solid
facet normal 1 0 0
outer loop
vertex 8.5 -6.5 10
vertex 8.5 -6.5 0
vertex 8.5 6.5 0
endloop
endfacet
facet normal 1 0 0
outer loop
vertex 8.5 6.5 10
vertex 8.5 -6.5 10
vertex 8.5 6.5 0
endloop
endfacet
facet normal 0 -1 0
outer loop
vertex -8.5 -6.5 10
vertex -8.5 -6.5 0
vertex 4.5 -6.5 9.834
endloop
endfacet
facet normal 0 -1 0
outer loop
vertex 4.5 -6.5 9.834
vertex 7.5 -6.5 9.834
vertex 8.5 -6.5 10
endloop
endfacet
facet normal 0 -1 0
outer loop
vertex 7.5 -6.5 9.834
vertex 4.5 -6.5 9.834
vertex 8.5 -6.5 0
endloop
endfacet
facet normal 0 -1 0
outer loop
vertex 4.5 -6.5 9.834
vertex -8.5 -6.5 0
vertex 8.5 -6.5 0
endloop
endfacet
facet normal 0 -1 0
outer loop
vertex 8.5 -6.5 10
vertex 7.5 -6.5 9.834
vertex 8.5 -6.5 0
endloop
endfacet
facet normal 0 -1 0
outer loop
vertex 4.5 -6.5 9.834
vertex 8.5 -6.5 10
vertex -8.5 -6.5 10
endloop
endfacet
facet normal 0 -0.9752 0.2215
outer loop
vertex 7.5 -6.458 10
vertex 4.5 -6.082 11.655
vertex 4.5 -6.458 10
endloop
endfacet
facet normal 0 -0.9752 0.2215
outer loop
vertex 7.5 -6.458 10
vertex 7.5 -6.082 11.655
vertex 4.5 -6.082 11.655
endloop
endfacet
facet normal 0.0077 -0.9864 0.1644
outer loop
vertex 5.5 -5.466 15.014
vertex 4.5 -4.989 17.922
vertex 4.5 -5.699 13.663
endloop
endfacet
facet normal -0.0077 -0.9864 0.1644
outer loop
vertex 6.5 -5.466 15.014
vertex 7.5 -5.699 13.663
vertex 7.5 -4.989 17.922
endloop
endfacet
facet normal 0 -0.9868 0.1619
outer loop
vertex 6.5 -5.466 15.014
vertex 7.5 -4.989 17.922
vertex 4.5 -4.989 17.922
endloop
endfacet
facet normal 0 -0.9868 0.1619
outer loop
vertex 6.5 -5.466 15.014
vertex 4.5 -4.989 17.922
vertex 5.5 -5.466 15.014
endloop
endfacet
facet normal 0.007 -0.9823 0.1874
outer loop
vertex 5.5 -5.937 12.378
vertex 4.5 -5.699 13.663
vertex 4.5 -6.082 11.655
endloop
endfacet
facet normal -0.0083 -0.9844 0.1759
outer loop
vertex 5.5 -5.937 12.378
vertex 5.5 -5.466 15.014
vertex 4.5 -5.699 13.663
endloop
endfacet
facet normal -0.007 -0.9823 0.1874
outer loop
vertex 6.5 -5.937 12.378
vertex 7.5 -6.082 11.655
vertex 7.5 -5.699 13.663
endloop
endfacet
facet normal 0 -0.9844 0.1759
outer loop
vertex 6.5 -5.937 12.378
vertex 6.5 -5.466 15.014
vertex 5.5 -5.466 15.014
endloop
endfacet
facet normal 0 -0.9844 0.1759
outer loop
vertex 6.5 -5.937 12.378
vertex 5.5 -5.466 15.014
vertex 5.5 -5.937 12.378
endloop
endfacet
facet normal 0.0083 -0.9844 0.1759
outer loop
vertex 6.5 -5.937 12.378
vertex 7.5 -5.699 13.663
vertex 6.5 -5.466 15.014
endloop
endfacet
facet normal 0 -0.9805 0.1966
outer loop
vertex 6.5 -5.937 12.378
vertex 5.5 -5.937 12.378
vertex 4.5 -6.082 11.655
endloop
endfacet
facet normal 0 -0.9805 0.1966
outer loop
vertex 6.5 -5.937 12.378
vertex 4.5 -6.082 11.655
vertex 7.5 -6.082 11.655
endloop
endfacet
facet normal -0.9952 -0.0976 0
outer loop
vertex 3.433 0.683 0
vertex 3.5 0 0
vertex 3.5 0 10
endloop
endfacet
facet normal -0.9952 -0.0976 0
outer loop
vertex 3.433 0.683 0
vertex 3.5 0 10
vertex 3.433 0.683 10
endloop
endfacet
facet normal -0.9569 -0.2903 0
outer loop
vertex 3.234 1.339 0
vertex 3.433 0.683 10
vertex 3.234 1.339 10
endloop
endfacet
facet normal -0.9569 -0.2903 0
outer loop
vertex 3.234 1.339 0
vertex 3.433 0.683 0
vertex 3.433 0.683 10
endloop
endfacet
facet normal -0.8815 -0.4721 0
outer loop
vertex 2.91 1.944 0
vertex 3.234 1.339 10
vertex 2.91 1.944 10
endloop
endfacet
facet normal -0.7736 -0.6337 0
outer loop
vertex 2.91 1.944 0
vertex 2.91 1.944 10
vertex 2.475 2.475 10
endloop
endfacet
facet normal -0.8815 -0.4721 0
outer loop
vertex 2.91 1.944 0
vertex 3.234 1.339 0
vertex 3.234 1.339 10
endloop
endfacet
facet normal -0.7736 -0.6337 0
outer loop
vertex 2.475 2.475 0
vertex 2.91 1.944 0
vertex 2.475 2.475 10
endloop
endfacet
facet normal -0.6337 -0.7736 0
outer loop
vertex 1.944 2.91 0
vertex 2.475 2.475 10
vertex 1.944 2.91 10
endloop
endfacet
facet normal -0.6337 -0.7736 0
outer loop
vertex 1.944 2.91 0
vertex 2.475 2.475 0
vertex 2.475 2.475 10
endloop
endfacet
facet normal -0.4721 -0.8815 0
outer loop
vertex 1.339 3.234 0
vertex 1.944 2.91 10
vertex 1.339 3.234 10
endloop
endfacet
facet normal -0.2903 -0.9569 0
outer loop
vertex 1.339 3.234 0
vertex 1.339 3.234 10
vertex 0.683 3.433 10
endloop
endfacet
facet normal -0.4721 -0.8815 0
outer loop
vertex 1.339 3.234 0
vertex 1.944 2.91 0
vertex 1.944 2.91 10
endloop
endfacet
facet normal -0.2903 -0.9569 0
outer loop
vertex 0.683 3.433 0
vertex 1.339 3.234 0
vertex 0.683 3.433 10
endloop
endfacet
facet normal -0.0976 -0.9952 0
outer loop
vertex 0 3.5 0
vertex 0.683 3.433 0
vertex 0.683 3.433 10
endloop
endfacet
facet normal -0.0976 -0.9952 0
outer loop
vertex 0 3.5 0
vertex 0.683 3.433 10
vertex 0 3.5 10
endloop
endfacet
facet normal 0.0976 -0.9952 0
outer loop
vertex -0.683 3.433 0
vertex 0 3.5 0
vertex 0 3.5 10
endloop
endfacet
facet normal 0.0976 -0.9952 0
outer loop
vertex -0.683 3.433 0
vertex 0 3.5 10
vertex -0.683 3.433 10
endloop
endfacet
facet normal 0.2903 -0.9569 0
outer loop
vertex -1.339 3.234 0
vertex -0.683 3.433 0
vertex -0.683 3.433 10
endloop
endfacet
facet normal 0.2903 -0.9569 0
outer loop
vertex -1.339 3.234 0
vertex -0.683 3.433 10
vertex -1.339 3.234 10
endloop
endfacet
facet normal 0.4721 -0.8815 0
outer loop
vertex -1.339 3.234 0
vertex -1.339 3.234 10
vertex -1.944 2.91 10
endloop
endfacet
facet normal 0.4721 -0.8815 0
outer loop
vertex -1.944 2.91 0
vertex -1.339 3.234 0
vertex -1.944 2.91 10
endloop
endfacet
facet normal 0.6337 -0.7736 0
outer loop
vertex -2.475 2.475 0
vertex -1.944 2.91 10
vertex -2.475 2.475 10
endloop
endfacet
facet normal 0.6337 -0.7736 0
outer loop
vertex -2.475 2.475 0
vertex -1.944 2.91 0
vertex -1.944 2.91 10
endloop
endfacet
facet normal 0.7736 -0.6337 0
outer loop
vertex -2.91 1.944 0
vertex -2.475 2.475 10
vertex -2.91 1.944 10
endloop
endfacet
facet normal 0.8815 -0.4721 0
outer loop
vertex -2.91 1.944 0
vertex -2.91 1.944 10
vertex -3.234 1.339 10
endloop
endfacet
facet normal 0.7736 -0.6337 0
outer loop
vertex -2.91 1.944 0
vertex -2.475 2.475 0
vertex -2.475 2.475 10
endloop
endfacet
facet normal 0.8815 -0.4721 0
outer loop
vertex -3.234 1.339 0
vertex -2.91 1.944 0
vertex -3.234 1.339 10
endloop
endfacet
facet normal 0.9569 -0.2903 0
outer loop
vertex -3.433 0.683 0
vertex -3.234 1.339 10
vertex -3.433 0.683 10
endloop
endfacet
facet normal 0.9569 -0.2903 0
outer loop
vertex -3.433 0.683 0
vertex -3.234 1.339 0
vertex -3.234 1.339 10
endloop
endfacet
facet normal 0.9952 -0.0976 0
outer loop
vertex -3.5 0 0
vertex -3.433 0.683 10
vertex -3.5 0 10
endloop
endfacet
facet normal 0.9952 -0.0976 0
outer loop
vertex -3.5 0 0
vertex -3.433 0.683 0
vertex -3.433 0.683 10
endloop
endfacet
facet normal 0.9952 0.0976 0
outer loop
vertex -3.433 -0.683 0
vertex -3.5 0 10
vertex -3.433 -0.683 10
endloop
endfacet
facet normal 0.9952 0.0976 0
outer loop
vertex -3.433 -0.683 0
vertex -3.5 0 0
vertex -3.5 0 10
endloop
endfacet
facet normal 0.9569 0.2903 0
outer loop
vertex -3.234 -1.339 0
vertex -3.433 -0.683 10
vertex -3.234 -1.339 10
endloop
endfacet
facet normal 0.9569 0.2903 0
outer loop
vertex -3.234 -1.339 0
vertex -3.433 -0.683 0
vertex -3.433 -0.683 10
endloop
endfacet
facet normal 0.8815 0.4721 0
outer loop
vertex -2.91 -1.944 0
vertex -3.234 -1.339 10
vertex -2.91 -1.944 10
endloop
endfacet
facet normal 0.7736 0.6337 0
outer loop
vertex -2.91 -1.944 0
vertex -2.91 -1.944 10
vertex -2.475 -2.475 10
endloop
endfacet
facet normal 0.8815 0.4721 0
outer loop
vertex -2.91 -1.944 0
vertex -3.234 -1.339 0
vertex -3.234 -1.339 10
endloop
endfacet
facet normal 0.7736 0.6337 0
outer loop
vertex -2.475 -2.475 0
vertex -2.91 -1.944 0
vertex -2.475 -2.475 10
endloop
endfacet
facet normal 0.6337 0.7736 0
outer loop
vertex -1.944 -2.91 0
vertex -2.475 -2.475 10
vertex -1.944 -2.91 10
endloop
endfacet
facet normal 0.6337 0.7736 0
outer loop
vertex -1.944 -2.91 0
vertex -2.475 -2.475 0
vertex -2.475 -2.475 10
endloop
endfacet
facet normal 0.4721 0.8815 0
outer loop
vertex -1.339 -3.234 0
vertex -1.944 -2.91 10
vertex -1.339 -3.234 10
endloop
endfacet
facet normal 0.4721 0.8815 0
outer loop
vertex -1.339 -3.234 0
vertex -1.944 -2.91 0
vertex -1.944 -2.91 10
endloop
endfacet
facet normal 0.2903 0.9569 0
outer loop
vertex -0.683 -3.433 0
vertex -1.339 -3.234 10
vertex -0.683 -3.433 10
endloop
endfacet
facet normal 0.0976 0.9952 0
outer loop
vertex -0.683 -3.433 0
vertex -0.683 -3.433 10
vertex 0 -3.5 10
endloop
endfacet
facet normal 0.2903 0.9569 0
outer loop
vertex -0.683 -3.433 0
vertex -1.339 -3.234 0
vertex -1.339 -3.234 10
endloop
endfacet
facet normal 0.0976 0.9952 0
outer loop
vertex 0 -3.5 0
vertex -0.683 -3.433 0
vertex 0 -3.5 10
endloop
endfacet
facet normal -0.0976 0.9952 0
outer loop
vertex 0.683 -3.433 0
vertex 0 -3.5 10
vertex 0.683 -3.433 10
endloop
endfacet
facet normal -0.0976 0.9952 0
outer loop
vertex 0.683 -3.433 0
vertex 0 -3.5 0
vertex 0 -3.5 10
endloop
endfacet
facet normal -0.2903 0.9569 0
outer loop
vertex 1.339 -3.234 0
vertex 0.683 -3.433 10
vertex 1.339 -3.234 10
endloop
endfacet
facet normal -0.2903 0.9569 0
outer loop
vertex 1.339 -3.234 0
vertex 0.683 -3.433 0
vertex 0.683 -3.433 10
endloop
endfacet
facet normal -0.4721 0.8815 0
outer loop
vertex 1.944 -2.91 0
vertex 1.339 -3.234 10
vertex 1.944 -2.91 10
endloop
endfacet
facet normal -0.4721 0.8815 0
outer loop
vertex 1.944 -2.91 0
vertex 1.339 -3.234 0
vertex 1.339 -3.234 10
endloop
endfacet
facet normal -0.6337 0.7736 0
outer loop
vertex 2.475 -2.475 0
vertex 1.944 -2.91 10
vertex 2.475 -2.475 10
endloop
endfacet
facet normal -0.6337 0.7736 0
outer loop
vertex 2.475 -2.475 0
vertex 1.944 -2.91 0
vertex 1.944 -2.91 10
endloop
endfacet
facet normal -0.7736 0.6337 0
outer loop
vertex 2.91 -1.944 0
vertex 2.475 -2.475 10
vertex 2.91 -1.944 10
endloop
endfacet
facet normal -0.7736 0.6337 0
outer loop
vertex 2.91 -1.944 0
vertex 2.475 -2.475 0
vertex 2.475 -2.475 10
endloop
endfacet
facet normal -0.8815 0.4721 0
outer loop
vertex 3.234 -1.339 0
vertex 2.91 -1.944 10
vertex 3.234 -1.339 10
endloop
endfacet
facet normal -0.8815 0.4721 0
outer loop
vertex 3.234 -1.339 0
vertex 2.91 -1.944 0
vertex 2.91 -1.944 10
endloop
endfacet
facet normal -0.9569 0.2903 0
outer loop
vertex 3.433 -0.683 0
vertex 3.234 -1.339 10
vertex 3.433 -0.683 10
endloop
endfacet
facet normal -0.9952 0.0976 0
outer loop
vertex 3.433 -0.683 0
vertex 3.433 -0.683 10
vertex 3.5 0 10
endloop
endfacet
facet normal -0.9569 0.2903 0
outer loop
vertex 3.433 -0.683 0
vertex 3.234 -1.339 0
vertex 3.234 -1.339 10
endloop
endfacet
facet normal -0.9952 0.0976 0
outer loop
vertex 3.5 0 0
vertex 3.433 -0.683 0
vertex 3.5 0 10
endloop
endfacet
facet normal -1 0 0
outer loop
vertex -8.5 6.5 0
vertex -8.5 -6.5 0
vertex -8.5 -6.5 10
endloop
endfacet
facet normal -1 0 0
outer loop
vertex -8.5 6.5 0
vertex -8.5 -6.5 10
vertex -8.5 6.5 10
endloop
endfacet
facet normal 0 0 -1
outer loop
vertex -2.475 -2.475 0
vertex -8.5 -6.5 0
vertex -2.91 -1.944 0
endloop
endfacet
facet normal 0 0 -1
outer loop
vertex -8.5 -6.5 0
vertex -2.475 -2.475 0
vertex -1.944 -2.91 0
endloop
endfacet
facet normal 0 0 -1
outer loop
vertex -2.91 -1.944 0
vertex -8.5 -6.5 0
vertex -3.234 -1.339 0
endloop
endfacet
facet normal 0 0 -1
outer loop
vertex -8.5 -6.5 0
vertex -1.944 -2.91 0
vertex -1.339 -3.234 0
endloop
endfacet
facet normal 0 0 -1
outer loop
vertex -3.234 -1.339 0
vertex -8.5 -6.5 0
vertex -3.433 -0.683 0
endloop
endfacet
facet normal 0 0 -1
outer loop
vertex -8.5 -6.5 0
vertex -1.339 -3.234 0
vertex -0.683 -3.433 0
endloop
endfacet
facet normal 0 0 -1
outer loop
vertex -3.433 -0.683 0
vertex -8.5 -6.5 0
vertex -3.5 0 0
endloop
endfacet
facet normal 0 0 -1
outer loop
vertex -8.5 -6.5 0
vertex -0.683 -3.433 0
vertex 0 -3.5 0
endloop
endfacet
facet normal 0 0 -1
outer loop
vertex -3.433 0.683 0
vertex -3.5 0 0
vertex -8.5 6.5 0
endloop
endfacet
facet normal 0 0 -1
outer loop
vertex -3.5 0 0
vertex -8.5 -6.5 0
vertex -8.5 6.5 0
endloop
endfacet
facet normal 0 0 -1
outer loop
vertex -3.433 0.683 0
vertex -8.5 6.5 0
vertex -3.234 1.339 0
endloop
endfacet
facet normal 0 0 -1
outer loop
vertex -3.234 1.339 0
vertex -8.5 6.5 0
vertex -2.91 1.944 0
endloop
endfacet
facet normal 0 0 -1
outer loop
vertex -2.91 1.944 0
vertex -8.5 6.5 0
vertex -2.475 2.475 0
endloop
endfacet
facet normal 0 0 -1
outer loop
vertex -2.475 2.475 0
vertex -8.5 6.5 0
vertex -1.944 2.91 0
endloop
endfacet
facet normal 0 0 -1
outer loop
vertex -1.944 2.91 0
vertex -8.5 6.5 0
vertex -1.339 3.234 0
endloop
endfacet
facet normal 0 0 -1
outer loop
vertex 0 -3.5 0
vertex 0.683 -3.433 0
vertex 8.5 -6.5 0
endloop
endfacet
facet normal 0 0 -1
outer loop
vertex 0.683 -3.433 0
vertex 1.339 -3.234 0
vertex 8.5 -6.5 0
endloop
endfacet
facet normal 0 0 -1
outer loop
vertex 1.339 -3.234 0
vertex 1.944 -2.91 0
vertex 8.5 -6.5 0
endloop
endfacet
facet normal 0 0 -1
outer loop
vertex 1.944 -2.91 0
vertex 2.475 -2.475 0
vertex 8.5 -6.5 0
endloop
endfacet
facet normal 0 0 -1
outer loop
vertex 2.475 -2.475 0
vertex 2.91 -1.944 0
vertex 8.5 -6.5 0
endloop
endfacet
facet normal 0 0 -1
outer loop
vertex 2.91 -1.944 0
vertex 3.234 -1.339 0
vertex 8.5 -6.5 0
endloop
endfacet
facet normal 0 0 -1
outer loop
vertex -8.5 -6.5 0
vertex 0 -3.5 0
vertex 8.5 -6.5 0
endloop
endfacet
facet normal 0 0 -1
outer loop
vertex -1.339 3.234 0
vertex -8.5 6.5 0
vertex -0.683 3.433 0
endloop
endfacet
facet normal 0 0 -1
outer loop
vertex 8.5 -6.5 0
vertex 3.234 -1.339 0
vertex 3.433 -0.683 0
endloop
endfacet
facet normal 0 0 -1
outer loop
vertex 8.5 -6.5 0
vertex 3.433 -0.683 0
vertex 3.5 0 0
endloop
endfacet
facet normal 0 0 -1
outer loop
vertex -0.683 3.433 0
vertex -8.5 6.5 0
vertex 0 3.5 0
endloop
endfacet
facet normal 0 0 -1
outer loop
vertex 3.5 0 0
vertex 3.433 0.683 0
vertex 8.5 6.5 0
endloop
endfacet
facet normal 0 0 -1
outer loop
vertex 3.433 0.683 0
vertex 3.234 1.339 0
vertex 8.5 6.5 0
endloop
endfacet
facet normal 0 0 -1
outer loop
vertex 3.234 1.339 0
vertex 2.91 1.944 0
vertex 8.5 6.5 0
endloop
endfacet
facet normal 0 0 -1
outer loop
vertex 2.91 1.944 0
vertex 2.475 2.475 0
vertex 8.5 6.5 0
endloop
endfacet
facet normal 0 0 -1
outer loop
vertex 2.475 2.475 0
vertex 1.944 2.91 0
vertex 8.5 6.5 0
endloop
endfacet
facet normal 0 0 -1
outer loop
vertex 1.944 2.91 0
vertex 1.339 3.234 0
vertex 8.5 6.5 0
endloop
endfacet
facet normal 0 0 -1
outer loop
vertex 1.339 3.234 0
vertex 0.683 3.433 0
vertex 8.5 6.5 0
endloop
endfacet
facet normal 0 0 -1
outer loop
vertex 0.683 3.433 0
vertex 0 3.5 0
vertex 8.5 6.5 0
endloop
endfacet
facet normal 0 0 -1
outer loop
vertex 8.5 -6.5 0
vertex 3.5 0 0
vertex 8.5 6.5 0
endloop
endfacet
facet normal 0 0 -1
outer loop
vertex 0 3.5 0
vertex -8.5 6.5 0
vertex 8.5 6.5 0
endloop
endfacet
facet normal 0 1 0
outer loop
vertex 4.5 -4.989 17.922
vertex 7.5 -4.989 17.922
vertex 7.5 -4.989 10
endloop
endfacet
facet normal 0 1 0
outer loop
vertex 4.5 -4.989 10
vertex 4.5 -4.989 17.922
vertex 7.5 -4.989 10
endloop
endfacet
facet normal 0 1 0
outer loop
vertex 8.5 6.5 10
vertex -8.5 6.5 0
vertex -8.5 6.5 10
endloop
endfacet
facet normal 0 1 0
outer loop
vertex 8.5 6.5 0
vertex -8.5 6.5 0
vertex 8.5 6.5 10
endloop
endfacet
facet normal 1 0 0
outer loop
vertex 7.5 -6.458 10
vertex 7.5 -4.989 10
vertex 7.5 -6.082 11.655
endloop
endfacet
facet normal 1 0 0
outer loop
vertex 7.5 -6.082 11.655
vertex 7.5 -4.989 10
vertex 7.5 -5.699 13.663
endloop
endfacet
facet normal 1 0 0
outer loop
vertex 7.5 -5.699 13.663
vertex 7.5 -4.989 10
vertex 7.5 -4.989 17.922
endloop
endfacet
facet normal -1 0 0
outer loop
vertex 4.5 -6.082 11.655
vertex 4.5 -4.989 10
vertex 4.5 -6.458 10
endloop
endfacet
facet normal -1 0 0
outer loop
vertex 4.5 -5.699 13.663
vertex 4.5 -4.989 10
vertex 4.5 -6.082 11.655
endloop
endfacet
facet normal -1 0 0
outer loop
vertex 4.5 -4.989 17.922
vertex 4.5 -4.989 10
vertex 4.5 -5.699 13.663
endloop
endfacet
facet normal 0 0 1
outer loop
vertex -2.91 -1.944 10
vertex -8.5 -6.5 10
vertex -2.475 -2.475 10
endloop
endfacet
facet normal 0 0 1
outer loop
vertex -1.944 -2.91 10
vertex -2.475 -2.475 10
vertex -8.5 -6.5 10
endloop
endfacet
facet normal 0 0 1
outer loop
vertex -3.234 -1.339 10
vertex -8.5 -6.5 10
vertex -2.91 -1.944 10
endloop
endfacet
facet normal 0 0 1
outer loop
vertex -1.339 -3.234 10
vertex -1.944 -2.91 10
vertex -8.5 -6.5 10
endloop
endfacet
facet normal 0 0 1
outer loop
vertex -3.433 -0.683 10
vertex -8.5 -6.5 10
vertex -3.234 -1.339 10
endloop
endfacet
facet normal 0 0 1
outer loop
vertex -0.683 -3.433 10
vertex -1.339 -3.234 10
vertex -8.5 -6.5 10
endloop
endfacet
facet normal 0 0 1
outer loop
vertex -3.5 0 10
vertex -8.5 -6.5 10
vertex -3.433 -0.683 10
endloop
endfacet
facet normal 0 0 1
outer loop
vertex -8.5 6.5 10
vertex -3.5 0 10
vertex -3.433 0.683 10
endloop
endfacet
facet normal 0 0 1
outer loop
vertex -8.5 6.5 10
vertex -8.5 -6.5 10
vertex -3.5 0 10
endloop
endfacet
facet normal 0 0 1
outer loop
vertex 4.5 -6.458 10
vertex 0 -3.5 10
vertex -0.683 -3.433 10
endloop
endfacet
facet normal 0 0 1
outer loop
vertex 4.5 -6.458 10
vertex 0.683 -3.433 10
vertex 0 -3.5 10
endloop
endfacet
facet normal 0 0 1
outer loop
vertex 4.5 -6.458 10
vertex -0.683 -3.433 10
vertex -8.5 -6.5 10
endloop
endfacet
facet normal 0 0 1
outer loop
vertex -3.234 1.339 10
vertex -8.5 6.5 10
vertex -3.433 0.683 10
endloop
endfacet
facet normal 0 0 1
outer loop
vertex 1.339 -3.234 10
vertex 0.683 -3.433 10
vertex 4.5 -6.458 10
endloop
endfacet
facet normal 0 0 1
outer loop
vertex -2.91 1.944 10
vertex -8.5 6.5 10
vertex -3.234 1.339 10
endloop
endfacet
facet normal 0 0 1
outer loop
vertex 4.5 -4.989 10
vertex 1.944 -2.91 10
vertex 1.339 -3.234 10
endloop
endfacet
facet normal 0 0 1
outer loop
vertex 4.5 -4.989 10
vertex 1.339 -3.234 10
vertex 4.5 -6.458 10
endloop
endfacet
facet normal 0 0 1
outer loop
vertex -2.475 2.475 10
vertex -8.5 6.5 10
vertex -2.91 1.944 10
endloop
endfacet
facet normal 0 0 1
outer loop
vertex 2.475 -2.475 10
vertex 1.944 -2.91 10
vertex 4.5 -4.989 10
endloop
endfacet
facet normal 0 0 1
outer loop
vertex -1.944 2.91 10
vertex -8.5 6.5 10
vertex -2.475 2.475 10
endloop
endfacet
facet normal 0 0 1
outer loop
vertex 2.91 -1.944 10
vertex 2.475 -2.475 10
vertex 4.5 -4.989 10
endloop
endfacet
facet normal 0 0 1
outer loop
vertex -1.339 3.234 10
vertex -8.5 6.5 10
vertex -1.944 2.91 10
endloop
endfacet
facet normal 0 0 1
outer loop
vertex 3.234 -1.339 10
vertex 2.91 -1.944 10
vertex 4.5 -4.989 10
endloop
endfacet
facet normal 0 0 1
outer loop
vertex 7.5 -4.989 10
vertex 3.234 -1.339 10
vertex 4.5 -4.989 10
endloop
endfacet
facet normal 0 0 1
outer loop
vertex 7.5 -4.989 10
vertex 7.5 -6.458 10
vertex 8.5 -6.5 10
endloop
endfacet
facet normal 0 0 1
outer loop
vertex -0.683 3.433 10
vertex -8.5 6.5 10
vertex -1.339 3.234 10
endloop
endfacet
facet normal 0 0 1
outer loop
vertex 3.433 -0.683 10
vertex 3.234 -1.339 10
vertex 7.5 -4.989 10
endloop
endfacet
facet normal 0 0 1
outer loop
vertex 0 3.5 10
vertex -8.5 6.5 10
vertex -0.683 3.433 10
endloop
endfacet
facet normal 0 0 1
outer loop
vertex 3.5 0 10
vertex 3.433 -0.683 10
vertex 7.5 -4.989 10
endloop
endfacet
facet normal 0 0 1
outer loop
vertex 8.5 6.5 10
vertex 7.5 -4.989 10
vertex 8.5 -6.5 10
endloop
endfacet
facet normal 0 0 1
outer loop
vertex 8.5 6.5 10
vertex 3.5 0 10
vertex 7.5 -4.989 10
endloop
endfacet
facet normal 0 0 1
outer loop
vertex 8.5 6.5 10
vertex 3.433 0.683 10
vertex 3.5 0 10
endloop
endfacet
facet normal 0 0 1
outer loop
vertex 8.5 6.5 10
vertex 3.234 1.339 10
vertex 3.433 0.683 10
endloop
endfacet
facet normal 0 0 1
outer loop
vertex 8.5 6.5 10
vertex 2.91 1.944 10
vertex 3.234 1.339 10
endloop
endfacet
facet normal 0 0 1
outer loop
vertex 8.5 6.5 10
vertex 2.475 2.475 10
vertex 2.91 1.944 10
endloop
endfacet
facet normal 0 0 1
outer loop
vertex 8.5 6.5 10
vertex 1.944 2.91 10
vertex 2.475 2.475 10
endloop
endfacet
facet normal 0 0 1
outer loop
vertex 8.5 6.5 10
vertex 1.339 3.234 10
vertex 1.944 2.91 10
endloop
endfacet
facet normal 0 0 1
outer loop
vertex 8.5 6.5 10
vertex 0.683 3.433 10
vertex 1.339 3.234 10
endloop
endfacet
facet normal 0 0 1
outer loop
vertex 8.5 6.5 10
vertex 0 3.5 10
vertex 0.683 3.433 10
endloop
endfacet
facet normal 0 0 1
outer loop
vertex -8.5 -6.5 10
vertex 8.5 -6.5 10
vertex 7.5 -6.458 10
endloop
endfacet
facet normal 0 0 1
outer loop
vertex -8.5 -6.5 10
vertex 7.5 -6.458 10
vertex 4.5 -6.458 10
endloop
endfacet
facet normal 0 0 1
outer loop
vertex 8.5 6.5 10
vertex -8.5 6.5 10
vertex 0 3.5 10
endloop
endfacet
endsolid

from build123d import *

# Parameters (mm, degrees)
SKETCH_W     = 17
SKETCH_H     = 13
SKETCH_R     = 3.5
PAD_DEPTH    = 10
PAD001_DEPTH = 3


with BuildPart() as support_pd:
    # Sketch → Pad (new body)
    with BuildSketch(Plane.XY):
        Rectangle(SKETCH_W, SKETCH_H)
        Circle(SKETCH_R, mode=Mode.SUBTRACT)
    extrude(amount=PAD_DEPTH)


with BuildPart() as renfort_pad:
    # Pad001 base: copy of support_pd
    add(support_pd.part)

    # Sketch003 → Pad001 (new body)
    with BuildSketch(Plane.YZ.offset(7.5)):
        with BuildLine():
            Line((4.98859, 17.9219), (4.98859, 9.858518))
            Line((4.98859, 9.858518), (6.5, 9.833834))
            add(Edge.make_bspline(
                [(4.98859, 17.9219), (5.5, 14.7982), (5.91318, 12.1235), (6.5, 9.833834)],
                knots=[0, 0, 0, 0, 1, 1, 1, 1], degree=3))
        make_face()
    pad001 = extrude(amount=-PAD001_DEPTH)


with BuildPart() as mirrored:
    # Mirrored base: copy of support_pd
    add(support_pd.part)

    # Mirrored: Pad001 across Sketch003 V_Axis
    add(pad001.mirror(Plane(origin=(7.5, 0, 0), x_dir=(1, 0, 0), z_dir=(0, 1, 0))))


solid = mirrored.part
